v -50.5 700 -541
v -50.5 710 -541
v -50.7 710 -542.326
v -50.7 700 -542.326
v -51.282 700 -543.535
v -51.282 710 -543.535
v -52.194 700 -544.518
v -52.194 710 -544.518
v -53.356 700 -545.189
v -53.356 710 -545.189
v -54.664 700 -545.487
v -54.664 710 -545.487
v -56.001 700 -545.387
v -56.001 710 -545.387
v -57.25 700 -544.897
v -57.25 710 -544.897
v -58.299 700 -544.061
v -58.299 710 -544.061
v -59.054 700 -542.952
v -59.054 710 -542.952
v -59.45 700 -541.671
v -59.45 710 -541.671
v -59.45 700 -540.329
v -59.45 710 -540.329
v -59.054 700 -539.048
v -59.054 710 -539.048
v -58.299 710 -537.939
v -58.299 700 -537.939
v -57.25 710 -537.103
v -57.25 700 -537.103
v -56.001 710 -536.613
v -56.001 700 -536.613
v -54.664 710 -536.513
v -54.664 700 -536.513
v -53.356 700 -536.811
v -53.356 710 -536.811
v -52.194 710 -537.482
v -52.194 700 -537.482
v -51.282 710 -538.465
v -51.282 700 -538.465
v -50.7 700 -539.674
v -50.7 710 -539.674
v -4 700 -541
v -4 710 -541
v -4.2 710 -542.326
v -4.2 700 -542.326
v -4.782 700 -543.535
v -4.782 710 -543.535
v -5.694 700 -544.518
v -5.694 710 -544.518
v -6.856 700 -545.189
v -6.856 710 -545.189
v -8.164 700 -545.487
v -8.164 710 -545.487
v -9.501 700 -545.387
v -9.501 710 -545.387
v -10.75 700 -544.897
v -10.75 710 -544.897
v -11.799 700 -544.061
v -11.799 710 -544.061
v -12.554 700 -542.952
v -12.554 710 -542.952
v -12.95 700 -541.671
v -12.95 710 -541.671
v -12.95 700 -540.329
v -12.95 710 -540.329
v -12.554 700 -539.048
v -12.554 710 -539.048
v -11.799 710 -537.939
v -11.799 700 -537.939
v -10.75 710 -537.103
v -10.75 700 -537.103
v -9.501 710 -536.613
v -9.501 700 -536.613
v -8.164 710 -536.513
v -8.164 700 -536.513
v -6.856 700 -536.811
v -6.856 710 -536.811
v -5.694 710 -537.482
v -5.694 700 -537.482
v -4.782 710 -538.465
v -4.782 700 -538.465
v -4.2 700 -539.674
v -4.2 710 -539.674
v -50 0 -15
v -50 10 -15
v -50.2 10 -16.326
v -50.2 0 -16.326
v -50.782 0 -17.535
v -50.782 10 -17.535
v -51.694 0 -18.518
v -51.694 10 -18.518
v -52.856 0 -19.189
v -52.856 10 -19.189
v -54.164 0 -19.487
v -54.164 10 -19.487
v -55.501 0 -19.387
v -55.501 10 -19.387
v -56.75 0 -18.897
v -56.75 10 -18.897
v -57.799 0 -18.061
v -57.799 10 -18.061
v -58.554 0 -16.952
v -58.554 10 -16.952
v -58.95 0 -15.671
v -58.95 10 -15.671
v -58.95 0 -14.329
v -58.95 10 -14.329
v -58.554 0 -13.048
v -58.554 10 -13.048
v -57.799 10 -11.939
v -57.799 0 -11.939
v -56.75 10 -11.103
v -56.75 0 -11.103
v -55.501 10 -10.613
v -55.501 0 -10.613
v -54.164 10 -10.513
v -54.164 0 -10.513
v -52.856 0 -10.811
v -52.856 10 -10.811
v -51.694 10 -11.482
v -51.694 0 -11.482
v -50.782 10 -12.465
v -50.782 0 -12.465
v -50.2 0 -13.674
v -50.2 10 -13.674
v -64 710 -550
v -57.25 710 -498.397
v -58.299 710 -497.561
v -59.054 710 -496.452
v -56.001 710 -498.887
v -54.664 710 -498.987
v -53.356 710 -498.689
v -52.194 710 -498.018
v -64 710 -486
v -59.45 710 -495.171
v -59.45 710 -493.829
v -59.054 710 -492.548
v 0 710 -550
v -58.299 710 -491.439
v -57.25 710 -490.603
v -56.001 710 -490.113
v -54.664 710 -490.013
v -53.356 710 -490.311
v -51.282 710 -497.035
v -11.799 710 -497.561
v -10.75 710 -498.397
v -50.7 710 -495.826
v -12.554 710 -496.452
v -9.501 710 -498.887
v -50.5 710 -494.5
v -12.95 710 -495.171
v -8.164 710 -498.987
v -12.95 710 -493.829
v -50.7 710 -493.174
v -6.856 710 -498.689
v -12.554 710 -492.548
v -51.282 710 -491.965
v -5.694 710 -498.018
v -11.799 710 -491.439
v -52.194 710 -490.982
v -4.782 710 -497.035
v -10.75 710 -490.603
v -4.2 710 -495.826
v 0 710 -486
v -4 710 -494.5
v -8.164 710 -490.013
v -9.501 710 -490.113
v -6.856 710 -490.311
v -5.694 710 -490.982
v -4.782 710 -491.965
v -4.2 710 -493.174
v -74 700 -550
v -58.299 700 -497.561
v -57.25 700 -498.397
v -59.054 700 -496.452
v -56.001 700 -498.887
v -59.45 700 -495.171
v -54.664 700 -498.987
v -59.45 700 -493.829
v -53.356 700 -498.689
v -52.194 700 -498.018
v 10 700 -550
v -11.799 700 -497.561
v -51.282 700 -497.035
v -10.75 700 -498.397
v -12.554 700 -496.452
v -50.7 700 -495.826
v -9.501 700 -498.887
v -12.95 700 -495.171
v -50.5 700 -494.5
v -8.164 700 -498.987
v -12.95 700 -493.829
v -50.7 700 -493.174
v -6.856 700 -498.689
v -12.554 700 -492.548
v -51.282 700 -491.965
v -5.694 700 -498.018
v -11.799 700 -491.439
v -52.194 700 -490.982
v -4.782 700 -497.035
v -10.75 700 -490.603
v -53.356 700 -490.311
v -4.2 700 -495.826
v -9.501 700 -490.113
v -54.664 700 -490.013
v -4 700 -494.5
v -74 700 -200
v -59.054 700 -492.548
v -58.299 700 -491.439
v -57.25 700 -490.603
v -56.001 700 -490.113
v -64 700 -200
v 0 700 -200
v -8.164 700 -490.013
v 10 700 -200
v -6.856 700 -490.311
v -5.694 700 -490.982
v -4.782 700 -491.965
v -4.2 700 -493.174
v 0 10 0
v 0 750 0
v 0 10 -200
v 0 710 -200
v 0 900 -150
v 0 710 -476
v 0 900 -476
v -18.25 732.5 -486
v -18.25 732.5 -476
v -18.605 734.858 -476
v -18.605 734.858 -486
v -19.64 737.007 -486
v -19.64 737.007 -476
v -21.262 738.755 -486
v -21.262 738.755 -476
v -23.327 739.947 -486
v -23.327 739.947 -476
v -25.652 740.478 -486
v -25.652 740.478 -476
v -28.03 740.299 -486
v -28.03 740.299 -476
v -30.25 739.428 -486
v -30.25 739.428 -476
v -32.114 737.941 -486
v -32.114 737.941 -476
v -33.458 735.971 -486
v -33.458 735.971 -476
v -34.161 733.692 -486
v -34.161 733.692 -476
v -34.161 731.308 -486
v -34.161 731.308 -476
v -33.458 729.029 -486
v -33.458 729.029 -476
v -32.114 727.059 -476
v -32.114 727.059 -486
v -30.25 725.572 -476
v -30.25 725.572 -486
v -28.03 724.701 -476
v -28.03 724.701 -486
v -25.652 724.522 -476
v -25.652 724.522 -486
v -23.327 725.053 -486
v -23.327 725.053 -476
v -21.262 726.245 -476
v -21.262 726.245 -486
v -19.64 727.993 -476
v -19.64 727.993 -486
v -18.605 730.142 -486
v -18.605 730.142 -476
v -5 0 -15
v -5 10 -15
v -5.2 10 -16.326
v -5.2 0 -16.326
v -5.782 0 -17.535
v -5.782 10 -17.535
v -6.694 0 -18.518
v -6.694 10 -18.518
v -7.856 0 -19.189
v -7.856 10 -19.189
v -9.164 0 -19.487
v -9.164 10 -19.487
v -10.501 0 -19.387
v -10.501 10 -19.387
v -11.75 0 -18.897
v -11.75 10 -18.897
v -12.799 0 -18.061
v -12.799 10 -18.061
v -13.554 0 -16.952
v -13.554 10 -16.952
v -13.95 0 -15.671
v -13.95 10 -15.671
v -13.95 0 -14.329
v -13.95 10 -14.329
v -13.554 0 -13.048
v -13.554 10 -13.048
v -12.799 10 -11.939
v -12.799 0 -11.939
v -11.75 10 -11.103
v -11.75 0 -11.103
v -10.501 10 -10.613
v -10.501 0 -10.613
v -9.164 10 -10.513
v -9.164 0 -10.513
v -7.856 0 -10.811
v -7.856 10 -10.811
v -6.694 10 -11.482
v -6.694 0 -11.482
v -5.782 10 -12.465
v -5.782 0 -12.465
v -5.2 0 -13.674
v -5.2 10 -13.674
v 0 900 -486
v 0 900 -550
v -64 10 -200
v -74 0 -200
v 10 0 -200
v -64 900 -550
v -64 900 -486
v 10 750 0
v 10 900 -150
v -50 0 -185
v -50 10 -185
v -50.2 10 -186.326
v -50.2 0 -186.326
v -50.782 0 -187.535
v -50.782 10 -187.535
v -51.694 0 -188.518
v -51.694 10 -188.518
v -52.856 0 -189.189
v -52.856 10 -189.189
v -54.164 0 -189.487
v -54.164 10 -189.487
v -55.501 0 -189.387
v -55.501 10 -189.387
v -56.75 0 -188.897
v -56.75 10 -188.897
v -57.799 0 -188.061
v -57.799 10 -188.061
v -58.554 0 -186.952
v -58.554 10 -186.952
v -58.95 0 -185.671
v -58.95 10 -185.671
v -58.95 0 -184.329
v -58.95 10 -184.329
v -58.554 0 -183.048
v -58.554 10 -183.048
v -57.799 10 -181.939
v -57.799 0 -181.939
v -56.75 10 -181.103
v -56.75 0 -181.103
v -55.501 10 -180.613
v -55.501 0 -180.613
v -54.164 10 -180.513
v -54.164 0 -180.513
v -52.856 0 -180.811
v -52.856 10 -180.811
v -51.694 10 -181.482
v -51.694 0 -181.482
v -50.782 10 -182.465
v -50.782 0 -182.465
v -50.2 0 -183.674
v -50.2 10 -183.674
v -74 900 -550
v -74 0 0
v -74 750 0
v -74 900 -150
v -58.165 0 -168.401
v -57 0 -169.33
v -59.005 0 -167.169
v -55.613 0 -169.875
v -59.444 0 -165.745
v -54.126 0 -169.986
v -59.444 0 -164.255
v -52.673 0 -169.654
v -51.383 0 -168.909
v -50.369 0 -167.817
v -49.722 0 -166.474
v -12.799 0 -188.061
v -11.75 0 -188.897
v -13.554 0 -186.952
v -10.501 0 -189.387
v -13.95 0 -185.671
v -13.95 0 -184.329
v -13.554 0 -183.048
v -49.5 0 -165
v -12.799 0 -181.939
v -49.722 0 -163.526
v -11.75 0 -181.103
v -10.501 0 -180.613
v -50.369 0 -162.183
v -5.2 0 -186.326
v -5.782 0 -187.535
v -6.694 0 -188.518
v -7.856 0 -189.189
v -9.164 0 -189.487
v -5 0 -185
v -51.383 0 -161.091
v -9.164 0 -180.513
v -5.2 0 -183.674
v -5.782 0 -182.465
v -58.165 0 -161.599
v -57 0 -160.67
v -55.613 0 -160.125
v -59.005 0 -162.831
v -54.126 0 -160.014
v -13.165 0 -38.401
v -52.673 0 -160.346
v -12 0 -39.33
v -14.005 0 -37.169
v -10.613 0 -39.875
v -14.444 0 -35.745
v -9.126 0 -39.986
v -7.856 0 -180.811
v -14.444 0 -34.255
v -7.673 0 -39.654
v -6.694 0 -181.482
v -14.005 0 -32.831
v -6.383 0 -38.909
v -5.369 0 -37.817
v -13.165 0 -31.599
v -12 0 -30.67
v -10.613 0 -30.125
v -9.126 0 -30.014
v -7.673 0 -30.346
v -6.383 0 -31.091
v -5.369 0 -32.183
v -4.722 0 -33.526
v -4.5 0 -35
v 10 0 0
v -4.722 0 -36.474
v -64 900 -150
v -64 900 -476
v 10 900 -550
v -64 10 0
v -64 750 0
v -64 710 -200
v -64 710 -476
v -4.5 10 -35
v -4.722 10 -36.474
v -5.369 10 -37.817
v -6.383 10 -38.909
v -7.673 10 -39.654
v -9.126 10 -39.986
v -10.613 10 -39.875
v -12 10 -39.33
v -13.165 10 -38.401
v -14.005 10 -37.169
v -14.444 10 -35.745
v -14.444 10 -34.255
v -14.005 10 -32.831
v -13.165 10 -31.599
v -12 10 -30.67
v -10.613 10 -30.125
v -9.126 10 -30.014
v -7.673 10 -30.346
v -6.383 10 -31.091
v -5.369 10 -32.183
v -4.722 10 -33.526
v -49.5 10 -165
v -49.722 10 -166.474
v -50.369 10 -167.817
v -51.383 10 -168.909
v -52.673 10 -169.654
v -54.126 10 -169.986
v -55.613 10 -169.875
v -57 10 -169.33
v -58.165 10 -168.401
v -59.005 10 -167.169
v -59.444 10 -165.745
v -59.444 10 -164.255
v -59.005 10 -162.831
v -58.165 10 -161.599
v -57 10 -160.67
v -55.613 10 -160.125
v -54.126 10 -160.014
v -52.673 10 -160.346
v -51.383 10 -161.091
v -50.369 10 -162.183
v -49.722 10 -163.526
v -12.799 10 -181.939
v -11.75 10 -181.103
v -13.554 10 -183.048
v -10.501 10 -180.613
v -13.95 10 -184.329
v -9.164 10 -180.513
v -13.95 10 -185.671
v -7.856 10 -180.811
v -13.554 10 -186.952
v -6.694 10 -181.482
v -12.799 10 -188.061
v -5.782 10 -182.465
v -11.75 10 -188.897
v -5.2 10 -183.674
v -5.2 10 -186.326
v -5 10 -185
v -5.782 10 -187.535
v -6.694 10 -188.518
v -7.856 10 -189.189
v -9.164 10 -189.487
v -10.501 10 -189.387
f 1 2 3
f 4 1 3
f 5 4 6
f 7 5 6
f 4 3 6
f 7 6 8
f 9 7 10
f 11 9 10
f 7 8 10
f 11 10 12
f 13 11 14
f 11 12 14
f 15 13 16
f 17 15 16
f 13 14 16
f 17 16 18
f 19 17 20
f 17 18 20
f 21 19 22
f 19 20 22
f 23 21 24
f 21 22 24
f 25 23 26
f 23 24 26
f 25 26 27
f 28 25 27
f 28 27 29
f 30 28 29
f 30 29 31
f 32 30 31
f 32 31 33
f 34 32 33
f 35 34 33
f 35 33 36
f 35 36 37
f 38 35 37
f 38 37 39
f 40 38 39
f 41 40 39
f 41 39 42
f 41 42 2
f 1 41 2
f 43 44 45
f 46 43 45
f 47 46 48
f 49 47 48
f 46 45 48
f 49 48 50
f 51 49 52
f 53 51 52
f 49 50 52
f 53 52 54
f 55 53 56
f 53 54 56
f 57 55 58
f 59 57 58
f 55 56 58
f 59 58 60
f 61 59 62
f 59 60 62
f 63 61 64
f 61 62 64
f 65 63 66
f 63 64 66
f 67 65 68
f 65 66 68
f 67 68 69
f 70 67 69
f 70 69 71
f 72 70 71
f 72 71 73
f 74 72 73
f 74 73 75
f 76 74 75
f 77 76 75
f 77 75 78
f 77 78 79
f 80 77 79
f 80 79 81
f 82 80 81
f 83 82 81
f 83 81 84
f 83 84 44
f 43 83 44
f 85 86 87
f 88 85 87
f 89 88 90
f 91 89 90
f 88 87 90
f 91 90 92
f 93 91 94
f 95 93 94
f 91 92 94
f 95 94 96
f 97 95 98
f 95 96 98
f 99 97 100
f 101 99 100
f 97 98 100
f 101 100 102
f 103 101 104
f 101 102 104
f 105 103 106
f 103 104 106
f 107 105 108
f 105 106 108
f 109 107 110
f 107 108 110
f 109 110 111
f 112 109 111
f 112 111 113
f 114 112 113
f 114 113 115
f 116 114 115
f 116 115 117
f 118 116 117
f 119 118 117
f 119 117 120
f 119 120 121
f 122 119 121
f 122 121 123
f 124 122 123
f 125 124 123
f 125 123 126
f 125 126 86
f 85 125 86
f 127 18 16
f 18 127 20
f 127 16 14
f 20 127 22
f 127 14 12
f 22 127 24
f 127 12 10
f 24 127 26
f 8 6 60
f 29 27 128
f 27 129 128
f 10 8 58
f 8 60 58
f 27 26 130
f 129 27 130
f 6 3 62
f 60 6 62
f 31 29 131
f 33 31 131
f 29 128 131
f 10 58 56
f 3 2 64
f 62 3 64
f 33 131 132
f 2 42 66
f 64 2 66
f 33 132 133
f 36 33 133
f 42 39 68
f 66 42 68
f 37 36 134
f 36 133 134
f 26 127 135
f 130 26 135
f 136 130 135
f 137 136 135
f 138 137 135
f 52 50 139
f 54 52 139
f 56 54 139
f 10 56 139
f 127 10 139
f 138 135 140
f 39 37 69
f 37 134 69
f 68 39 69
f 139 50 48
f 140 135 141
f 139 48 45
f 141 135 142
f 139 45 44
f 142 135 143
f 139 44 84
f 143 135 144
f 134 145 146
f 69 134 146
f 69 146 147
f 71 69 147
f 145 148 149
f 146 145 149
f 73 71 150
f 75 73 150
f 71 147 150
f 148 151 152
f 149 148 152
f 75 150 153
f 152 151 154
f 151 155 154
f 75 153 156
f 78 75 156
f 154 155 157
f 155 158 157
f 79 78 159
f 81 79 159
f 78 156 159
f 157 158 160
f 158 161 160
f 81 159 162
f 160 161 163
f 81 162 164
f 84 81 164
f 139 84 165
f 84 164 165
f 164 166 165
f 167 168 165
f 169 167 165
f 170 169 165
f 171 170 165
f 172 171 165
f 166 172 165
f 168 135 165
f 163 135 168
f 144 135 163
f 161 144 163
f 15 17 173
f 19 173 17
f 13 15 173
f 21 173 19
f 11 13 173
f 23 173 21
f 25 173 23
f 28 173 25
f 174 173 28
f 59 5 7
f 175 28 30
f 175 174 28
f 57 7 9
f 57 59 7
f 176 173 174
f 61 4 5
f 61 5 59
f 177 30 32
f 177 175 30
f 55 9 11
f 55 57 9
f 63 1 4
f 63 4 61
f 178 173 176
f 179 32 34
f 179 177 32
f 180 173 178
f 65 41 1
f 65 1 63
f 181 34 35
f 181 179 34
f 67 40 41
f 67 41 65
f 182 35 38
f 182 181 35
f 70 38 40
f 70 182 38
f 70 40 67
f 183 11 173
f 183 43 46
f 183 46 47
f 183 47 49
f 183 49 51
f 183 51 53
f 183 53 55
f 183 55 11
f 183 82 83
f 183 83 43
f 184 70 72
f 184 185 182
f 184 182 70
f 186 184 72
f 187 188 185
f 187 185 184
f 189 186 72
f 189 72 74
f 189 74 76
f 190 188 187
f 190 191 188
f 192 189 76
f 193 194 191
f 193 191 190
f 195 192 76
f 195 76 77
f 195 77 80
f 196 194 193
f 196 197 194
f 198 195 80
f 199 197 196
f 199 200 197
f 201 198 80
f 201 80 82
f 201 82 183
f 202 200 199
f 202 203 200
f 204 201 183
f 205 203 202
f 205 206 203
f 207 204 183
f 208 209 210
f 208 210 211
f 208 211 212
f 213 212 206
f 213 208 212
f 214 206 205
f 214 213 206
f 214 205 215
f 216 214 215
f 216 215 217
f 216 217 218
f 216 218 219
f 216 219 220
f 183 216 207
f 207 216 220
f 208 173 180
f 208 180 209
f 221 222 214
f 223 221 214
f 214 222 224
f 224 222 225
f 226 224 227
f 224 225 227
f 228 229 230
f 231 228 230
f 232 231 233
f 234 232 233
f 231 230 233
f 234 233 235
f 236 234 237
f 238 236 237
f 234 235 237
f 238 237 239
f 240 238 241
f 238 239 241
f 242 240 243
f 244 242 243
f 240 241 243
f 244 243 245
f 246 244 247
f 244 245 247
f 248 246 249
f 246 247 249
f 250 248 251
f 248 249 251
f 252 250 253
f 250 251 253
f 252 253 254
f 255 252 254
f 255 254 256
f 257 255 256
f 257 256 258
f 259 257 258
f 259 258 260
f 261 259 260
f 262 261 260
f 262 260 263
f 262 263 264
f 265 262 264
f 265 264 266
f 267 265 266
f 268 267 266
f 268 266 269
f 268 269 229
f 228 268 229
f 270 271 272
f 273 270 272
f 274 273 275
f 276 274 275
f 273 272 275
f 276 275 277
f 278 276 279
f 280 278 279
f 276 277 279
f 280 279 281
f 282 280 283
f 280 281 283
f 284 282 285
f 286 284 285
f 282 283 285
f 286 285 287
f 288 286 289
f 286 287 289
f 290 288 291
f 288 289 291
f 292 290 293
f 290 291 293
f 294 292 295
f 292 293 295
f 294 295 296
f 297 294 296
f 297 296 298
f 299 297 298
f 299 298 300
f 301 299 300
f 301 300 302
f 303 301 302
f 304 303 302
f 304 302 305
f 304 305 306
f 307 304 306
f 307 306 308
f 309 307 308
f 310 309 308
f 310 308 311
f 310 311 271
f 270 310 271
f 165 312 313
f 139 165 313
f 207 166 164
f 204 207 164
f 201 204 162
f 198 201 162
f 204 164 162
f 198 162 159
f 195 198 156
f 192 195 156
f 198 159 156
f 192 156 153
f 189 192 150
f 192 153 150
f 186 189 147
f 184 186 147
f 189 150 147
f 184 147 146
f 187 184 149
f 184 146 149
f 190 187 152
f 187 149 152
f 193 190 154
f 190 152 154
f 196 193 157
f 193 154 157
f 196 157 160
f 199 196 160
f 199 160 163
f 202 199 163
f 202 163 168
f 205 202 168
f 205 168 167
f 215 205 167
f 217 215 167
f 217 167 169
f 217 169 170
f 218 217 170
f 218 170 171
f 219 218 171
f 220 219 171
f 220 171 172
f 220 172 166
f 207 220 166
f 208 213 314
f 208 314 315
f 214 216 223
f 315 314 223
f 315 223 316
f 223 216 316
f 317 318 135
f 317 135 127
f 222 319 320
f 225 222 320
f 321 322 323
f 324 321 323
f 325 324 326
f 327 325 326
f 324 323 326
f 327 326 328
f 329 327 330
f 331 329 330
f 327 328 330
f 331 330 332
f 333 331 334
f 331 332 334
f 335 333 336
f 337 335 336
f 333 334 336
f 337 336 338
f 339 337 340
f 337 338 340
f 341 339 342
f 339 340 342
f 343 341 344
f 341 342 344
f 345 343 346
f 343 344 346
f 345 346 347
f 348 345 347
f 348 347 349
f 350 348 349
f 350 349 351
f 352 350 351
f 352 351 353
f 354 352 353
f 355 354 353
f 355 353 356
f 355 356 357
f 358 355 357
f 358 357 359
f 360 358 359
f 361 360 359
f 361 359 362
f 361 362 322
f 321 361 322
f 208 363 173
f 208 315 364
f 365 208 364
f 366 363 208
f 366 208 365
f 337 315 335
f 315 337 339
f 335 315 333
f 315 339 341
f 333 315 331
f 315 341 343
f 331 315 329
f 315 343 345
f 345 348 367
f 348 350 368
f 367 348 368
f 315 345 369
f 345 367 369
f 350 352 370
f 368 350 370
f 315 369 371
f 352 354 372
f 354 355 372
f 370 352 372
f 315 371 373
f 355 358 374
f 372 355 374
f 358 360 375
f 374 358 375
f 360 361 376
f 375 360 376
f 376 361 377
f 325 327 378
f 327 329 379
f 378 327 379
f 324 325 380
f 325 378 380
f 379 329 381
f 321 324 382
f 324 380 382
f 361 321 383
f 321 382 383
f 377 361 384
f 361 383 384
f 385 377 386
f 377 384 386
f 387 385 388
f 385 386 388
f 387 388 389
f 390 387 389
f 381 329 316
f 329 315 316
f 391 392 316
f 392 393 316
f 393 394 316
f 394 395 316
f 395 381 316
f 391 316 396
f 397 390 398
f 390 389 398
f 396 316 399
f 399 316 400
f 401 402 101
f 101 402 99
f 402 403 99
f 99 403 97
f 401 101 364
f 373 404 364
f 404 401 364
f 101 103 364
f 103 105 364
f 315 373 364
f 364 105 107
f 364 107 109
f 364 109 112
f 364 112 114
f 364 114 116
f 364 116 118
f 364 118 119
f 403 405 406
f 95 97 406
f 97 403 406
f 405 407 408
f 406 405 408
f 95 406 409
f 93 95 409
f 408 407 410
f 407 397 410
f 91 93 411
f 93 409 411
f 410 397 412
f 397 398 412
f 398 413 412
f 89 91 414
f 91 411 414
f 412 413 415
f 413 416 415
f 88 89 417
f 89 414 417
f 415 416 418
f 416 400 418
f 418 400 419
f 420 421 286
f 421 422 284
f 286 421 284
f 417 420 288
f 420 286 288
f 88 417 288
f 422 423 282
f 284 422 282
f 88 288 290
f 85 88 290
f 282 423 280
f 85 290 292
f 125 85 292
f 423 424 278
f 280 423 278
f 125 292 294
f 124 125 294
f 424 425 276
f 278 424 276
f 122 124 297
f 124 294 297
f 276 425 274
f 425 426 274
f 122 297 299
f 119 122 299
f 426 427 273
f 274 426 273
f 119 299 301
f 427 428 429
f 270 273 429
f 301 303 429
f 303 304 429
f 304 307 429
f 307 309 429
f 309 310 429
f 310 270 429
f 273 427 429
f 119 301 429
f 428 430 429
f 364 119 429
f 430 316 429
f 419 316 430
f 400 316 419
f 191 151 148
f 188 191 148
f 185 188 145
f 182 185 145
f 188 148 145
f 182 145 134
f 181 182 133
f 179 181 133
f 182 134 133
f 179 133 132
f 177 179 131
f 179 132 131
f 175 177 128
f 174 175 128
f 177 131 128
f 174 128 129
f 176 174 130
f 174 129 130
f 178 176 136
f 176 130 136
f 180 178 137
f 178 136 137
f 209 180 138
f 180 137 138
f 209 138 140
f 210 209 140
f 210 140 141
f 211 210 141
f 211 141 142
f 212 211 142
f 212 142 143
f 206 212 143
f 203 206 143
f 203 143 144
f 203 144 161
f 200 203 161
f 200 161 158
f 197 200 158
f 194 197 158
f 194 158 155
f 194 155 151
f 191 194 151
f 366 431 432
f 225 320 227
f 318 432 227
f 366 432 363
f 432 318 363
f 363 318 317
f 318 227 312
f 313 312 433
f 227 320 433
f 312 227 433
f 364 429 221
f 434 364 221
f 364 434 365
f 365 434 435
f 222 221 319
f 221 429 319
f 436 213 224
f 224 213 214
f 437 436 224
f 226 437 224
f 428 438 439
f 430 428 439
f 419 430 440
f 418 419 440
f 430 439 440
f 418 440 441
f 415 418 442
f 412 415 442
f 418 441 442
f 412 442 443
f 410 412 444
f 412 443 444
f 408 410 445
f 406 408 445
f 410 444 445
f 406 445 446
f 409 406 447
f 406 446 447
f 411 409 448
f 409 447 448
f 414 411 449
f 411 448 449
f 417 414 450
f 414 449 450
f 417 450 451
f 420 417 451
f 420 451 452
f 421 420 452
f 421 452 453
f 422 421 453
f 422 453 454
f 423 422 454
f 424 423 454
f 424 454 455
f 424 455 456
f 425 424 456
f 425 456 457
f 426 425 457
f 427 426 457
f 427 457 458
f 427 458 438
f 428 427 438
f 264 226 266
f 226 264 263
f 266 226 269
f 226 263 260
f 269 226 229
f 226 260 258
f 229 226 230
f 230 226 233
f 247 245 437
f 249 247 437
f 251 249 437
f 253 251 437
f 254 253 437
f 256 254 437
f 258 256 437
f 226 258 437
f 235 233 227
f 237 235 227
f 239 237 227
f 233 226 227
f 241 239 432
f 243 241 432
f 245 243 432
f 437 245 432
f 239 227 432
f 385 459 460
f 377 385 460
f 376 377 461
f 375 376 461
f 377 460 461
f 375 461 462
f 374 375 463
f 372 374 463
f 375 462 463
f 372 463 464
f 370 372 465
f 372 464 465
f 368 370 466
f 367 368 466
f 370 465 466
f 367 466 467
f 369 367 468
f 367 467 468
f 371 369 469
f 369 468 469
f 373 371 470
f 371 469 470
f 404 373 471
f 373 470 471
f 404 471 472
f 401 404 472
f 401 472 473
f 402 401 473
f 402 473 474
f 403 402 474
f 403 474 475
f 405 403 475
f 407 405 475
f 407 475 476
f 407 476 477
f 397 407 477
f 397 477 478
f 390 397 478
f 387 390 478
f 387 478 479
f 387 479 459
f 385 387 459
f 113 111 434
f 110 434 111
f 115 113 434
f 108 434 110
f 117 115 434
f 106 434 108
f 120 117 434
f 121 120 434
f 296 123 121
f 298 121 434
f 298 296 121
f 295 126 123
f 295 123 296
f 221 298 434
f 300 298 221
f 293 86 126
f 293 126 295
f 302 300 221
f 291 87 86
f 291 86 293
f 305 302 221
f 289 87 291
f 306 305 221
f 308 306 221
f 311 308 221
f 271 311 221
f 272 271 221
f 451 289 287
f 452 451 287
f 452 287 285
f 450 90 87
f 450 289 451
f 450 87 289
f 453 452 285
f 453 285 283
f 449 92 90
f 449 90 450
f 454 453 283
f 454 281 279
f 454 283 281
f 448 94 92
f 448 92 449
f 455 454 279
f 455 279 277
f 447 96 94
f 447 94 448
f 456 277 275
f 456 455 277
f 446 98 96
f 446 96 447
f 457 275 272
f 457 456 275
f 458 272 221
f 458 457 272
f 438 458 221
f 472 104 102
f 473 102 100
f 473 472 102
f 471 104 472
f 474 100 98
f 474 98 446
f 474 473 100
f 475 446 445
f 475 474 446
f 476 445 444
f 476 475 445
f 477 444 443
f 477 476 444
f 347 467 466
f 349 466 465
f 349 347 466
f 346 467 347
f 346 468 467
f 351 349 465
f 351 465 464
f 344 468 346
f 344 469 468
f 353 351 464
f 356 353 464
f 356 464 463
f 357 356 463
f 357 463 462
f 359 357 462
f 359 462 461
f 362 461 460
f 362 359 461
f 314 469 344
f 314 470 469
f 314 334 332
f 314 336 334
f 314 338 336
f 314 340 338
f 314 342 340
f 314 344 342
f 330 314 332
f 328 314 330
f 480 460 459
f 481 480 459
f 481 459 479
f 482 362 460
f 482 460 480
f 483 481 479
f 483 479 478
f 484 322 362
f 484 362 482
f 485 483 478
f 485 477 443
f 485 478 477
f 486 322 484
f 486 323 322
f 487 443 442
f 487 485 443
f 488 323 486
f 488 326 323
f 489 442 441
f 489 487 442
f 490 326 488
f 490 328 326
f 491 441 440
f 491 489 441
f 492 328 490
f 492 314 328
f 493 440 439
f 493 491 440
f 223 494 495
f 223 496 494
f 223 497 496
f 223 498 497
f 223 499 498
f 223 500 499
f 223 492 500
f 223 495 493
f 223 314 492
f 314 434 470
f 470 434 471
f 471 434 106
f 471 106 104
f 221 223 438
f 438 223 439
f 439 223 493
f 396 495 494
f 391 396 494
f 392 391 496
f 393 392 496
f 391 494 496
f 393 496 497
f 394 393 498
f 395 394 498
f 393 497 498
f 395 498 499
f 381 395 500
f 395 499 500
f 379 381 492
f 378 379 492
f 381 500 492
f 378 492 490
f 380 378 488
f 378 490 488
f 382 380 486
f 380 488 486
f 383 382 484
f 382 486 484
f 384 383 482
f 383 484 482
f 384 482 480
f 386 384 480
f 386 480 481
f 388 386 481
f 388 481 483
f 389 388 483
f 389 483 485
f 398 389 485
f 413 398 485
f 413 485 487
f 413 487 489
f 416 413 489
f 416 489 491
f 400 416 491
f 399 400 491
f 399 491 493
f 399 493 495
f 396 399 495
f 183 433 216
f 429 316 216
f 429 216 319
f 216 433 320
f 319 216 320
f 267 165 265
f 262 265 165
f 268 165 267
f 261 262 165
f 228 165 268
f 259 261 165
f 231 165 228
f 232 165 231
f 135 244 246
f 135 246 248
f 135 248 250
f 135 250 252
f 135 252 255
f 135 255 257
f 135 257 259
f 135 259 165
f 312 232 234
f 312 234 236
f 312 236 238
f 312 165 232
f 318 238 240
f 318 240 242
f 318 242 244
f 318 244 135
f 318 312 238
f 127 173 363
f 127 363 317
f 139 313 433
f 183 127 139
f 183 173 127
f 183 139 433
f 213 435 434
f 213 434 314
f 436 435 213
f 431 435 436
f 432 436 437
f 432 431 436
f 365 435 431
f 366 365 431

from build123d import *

# Parameters (mm, degrees)
BOSS_EXTRUDE1_DEPTH      = 10
BOSS_EXTRUDE1_DEPTH_BACK = 74
SKETCH3_W                = 64
SKETCH3_H                = 550
CUT_EXTRUDE1_DEPTH       = 890
SKETCH4_W                = 64
SKETCH4_H                = 350
BOSS_EXTRUDE2_DEPTH      = 10
SKETCH5_W                = 64
SKETCH5_H                = 190
BOSS_EXTRUDE3_DEPTH      = 10
CUT_EXTRUDE2_REACH       = 712
SKETCH6_R                = 4.5
CUT_EXTRUDE3_REACH       = 76
SKETCH7_R                = 8
CUT_EXTRUDE4_REACH       = 12
SKETCH8_R                = 4.5
SKETCH8_R_2              = 5


with BuildPart() as part:
    # Sketch1 → Boss-Extrude1 (new body, two sides)
    with BuildSketch(Plane(origin=(0, 0, 0), x_dir=(0, 0, -1), z_dir=(1, 0, 0))) as boss_extrude1_sk:
        Polygon((0, 0), (0, 750), (150, 900), (550, 900), (550, 700), (200, 700), (200, 0), align=None)
    extrude(amount=BOSS_EXTRUDE1_DEPTH)
    extrude(boss_extrude1_sk.sketch, amount=-BOSS_EXTRUDE1_DEPTH_BACK)

    # Sketch3 → Cut-Extrude1 (cut)
    with BuildSketch(Plane(origin=(0, 900, 0), x_dir=(1, 0, 0), z_dir=(0, 1, 0))):
        with Locations((-32, 275)):
            Rectangle(SKETCH3_W, SKETCH3_H)
    extrude(amount=-CUT_EXTRUDE1_DEPTH, mode=Mode.SUBTRACT)

    # Sketch4 → Boss-Extrude2 (add)
    with BuildSketch(Plane.XZ.offset(-700)):
        with Locations((-32, -375)):
            Rectangle(SKETCH4_W, SKETCH4_H)
    extrude(amount=-BOSS_EXTRUDE2_DEPTH)

    # Sketch5 → Boss-Extrude3 (add)
    with BuildSketch(Plane(origin=(0, 0, -486), x_dir=(-1, 0, 0), z_dir=(0, 0, -1))):
        with Locations((32, 805)):
            Rectangle(SKETCH5_W, SKETCH5_H)
    extrude(amount=-BOSS_EXTRUDE3_DEPTH)

    # Sketch6 → Cut-Extrude2 (cut, up to next)
    with BuildSketch(Plane(origin=(0, 710, 0), x_dir=(1, 0, 0), z_dir=(0, 1, 0)), mode=Mode.PRIVATE) as cut_extrude2_sk1:
        with Locations((-8.5, 494.5)):
            Circle(SKETCH6_R)
    cut_extrude2_tool1 = extrude(cut_extrude2_sk1.sketch, amount=-CUT_EXTRUDE2_REACH, mode=Mode.PRIVATE) & part.part
    add(cut_extrude2_tool1.solids().sort_by_distance((-8.5, 710, -494.5))[0], mode=Mode.SUBTRACT)
    # Sketch6 → Cut-Extrude2 (cut, up to next)
    with BuildSketch(Plane(origin=(0, 710, 0), x_dir=(1, 0, 0), z_dir=(0, 1, 0)), mode=Mode.PRIVATE) as cut_extrude2_sk2:
        with Locations((-55, 494.5)):
            Circle(SKETCH6_R)
    cut_extrude2_tool2 = extrude(cut_extrude2_sk2.sketch, amount=-CUT_EXTRUDE2_REACH, mode=Mode.PRIVATE) & part.part
    add(cut_extrude2_tool2.solids().sort_by_distance((-55, 710, -494.5))[0], mode=Mode.SUBTRACT)
    # Sketch6 → Cut-Extrude2 (cut, up to next)
    with BuildSketch(Plane(origin=(0, 710, 0), x_dir=(1, 0, 0), z_dir=(0, 1, 0)), mode=Mode.PRIVATE) as cut_extrude2_sk3:
        with Locations((-55, 541)):
            Circle(SKETCH6_R)
    cut_extrude2_tool3 = extrude(cut_extrude2_sk3.sketch, amount=-CUT_EXTRUDE2_REACH, mode=Mode.PRIVATE) & part.part
    add(cut_extrude2_tool3.solids().sort_by_distance((-55, 710, -541))[0], mode=Mode.SUBTRACT)
    # Sketch6 → Cut-Extrude2 (cut, up to next)
    with BuildSketch(Plane(origin=(0, 710, 0), x_dir=(1, 0, 0), z_dir=(0, 1, 0)), mode=Mode.PRIVATE) as cut_extrude2_sk4:
        with Locations((-8.5, 541)):
            Circle(SKETCH6_R)
    cut_extrude2_tool4 = extrude(cut_extrude2_sk4.sketch, amount=-CUT_EXTRUDE2_REACH, mode=Mode.PRIVATE) & part.part
    add(cut_extrude2_tool4.solids().sort_by_distance((-8.5, 710, -541))[0], mode=Mode.SUBTRACT)

    # Sketch7 → Cut-Extrude3 (cut, up to next)
    with BuildSketch(Plane.XY.offset(-476), mode=Mode.PRIVATE) as cut_extrude3_sk1:
        with Locations((-26.25, 732.5)):
            Circle(SKETCH7_R)
    cut_extrude3_tool1 = extrude(cut_extrude3_sk1.sketch, amount=-CUT_EXTRUDE3_REACH, mode=Mode.PRIVATE) & part.part
    add(cut_extrude3_tool1.solids().sort_by_distance((-26.25, 732.5, -476))[0], mode=Mode.SUBTRACT)

    # Sketch8 → Cut-Extrude4 (cut, up to next)
    with BuildSketch(Plane(origin=(0, 10, 0), x_dir=(1, 0, 0), z_dir=(0, 1, 0)), mode=Mode.PRIVATE) as cut_extrude4_sk1:
        with Locations((-54.5, 185)):
            Circle(SKETCH8_R)
    cut_extrude4_tool1 = extrude(cut_extrude4_sk1.sketch, amount=-CUT_EXTRUDE4_REACH, mode=Mode.PRIVATE) & part.part
    add(cut_extrude4_tool1.solids().sort_by_distance((-54.5, 10, -185))[0], mode=Mode.SUBTRACT)
    # Sketch8 → Cut-Extrude4 (cut, up to next)
    with BuildSketch(Plane(origin=(0, 10, 0), x_dir=(1, 0, 0), z_dir=(0, 1, 0)), mode=Mode.PRIVATE) as cut_extrude4_sk2:
        with Locations((-54.5, 165)):
            Circle(SKETCH8_R_2)
    cut_extrude4_tool2 = extrude(cut_extrude4_sk2.sketch, amount=-CUT_EXTRUDE4_REACH, mode=Mode.PRIVATE) & part.part
    add(cut_extrude4_tool2.solids().sort_by_distance((-54.5, 10, -165))[0], mode=Mode.SUBTRACT)
    # Sketch8 → Cut-Extrude4 (cut, up to next)
    with BuildSketch(Plane(origin=(0, 10, 0), x_dir=(1, 0, 0), z_dir=(0, 1, 0)), mode=Mode.PRIVATE) as cut_extrude4_sk3:
        with Locations((-54.5, 15)):
            Circle(SKETCH8_R)
    cut_extrude4_tool3 = extrude(cut_extrude4_sk3.sketch, amount=-CUT_EXTRUDE4_REACH, mode=Mode.PRIVATE) & part.part
    add(cut_extrude4_tool3.solids().sort_by_distance((-54.5, 10, -15))[0], mode=Mode.SUBTRACT)
    # Sketch8 → Cut-Extrude4 (cut, up to next)
    with BuildSketch(Plane(origin=(0, 10, 0), x_dir=(1, 0, 0), z_dir=(0, 1, 0)), mode=Mode.PRIVATE) as cut_extrude4_sk4:
        with Locations((-9.5, 15)):
            Circle(SKETCH8_R)
    cut_extrude4_tool4 = extrude(cut_extrude4_sk4.sketch, amount=-CUT_EXTRUDE4_REACH, mode=Mode.PRIVATE) & part.part
    add(cut_extrude4_tool4.solids().sort_by_distance((-9.5, 10, -15))[0], mode=Mode.SUBTRACT)
    # Sketch8 → Cut-Extrude4 (cut, up to next)
    with BuildSketch(Plane(origin=(0, 10, 0), x_dir=(1, 0, 0), z_dir=(0, 1, 0)), mode=Mode.PRIVATE) as cut_extrude4_sk5:
        with Locations((-9.5, 35)):
            Circle(SKETCH8_R_2)
    cut_extrude4_tool5 = extrude(cut_extrude4_sk5.sketch, amount=-CUT_EXTRUDE4_REACH, mode=Mode.PRIVATE) & part.part
    add(cut_extrude4_tool5.solids().sort_by_distance((-9.5, 10, -35))[0], mode=Mode.SUBTRACT)
    # Sketch8 → Cut-Extrude4 (cut, up to next)
    with BuildSketch(Plane(origin=(0, 10, 0), x_dir=(1, 0, 0), z_dir=(0, 1, 0)), mode=Mode.PRIVATE) as cut_extrude4_sk6:
        with Locations((-9.5, 185)):
            Circle(SKETCH8_R)
    cut_extrude4_tool6 = extrude(cut_extrude4_sk6.sketch, amount=-CUT_EXTRUDE4_REACH, mode=Mode.PRIVATE) & part.part
    add(cut_extrude4_tool6.solids().sort_by_distance((-9.5, 10, -185))[0], mode=Mode.SUBTRACT)


solid = part.part
